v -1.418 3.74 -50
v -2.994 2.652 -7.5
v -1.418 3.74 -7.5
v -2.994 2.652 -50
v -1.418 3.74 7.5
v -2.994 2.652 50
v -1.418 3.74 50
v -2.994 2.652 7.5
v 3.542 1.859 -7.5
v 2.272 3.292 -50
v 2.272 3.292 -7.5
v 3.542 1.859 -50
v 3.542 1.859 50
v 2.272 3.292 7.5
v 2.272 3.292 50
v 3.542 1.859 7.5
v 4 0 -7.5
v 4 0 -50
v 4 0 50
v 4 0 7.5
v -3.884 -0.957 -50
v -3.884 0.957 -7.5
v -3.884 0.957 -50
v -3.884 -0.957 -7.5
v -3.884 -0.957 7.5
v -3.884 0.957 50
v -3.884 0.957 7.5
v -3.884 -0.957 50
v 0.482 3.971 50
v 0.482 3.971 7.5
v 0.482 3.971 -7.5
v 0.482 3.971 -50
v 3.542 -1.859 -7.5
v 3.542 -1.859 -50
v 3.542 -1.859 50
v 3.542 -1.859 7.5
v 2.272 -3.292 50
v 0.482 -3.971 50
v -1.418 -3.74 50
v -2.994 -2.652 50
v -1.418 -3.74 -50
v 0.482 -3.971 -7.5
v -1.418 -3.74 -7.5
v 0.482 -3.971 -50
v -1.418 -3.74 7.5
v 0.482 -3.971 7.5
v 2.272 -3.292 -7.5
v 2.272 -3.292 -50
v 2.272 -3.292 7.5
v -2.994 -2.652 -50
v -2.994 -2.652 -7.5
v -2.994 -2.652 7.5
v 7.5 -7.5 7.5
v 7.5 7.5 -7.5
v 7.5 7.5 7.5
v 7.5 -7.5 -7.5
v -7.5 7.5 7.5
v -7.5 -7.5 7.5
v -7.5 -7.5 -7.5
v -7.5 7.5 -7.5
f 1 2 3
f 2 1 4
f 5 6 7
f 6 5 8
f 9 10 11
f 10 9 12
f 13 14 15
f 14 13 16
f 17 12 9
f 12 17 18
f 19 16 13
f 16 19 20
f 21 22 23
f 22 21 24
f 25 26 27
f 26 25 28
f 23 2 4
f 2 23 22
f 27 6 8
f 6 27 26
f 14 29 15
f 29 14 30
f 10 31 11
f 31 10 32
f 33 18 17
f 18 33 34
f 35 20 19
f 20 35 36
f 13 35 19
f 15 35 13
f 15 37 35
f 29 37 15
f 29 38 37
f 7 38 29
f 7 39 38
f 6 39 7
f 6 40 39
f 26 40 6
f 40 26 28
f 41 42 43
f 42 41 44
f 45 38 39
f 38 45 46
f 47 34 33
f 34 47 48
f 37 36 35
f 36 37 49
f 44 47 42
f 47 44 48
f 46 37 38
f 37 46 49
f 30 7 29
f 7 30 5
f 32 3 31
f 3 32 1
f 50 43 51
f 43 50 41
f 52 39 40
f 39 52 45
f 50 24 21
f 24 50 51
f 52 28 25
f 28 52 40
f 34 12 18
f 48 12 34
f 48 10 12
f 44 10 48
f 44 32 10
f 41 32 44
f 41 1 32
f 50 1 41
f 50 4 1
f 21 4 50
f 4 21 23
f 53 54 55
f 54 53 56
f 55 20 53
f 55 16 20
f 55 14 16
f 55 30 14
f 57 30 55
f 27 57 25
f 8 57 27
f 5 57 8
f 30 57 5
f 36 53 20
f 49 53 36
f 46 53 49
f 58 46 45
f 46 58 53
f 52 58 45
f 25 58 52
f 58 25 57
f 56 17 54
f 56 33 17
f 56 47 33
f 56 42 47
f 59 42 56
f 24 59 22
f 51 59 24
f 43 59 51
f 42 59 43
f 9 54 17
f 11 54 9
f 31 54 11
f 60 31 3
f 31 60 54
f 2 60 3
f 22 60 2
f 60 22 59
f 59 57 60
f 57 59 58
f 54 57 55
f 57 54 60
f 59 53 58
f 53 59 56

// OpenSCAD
// all lengths are given in matrix3_mult

// the radius of the main shaft
r_main_shaft = 4;
// the length of the main shaft
l_main_shaft = 100;
// the width of the key
w_key = 15;

module one(){
    cube([10, 5, 17]);
    cube([20, 10, 3]);
}

//one();

module two() {
    sphere(r=10);

    cylinder(h=30, r=5, center=true);
}

module three() {
    cylinder(h=30, r1=0, r2=15, center=true);
}

module four() {
    cube([10, 5, 17], center=true);
}

module five() {
    // this is the main shaft for the rotor
    cylinder(h=l_main_shaft, r=r_main_shaft, center=true);

    // this is the key to hold the main shaft
    cube(w_key, center=true);
}

five();
